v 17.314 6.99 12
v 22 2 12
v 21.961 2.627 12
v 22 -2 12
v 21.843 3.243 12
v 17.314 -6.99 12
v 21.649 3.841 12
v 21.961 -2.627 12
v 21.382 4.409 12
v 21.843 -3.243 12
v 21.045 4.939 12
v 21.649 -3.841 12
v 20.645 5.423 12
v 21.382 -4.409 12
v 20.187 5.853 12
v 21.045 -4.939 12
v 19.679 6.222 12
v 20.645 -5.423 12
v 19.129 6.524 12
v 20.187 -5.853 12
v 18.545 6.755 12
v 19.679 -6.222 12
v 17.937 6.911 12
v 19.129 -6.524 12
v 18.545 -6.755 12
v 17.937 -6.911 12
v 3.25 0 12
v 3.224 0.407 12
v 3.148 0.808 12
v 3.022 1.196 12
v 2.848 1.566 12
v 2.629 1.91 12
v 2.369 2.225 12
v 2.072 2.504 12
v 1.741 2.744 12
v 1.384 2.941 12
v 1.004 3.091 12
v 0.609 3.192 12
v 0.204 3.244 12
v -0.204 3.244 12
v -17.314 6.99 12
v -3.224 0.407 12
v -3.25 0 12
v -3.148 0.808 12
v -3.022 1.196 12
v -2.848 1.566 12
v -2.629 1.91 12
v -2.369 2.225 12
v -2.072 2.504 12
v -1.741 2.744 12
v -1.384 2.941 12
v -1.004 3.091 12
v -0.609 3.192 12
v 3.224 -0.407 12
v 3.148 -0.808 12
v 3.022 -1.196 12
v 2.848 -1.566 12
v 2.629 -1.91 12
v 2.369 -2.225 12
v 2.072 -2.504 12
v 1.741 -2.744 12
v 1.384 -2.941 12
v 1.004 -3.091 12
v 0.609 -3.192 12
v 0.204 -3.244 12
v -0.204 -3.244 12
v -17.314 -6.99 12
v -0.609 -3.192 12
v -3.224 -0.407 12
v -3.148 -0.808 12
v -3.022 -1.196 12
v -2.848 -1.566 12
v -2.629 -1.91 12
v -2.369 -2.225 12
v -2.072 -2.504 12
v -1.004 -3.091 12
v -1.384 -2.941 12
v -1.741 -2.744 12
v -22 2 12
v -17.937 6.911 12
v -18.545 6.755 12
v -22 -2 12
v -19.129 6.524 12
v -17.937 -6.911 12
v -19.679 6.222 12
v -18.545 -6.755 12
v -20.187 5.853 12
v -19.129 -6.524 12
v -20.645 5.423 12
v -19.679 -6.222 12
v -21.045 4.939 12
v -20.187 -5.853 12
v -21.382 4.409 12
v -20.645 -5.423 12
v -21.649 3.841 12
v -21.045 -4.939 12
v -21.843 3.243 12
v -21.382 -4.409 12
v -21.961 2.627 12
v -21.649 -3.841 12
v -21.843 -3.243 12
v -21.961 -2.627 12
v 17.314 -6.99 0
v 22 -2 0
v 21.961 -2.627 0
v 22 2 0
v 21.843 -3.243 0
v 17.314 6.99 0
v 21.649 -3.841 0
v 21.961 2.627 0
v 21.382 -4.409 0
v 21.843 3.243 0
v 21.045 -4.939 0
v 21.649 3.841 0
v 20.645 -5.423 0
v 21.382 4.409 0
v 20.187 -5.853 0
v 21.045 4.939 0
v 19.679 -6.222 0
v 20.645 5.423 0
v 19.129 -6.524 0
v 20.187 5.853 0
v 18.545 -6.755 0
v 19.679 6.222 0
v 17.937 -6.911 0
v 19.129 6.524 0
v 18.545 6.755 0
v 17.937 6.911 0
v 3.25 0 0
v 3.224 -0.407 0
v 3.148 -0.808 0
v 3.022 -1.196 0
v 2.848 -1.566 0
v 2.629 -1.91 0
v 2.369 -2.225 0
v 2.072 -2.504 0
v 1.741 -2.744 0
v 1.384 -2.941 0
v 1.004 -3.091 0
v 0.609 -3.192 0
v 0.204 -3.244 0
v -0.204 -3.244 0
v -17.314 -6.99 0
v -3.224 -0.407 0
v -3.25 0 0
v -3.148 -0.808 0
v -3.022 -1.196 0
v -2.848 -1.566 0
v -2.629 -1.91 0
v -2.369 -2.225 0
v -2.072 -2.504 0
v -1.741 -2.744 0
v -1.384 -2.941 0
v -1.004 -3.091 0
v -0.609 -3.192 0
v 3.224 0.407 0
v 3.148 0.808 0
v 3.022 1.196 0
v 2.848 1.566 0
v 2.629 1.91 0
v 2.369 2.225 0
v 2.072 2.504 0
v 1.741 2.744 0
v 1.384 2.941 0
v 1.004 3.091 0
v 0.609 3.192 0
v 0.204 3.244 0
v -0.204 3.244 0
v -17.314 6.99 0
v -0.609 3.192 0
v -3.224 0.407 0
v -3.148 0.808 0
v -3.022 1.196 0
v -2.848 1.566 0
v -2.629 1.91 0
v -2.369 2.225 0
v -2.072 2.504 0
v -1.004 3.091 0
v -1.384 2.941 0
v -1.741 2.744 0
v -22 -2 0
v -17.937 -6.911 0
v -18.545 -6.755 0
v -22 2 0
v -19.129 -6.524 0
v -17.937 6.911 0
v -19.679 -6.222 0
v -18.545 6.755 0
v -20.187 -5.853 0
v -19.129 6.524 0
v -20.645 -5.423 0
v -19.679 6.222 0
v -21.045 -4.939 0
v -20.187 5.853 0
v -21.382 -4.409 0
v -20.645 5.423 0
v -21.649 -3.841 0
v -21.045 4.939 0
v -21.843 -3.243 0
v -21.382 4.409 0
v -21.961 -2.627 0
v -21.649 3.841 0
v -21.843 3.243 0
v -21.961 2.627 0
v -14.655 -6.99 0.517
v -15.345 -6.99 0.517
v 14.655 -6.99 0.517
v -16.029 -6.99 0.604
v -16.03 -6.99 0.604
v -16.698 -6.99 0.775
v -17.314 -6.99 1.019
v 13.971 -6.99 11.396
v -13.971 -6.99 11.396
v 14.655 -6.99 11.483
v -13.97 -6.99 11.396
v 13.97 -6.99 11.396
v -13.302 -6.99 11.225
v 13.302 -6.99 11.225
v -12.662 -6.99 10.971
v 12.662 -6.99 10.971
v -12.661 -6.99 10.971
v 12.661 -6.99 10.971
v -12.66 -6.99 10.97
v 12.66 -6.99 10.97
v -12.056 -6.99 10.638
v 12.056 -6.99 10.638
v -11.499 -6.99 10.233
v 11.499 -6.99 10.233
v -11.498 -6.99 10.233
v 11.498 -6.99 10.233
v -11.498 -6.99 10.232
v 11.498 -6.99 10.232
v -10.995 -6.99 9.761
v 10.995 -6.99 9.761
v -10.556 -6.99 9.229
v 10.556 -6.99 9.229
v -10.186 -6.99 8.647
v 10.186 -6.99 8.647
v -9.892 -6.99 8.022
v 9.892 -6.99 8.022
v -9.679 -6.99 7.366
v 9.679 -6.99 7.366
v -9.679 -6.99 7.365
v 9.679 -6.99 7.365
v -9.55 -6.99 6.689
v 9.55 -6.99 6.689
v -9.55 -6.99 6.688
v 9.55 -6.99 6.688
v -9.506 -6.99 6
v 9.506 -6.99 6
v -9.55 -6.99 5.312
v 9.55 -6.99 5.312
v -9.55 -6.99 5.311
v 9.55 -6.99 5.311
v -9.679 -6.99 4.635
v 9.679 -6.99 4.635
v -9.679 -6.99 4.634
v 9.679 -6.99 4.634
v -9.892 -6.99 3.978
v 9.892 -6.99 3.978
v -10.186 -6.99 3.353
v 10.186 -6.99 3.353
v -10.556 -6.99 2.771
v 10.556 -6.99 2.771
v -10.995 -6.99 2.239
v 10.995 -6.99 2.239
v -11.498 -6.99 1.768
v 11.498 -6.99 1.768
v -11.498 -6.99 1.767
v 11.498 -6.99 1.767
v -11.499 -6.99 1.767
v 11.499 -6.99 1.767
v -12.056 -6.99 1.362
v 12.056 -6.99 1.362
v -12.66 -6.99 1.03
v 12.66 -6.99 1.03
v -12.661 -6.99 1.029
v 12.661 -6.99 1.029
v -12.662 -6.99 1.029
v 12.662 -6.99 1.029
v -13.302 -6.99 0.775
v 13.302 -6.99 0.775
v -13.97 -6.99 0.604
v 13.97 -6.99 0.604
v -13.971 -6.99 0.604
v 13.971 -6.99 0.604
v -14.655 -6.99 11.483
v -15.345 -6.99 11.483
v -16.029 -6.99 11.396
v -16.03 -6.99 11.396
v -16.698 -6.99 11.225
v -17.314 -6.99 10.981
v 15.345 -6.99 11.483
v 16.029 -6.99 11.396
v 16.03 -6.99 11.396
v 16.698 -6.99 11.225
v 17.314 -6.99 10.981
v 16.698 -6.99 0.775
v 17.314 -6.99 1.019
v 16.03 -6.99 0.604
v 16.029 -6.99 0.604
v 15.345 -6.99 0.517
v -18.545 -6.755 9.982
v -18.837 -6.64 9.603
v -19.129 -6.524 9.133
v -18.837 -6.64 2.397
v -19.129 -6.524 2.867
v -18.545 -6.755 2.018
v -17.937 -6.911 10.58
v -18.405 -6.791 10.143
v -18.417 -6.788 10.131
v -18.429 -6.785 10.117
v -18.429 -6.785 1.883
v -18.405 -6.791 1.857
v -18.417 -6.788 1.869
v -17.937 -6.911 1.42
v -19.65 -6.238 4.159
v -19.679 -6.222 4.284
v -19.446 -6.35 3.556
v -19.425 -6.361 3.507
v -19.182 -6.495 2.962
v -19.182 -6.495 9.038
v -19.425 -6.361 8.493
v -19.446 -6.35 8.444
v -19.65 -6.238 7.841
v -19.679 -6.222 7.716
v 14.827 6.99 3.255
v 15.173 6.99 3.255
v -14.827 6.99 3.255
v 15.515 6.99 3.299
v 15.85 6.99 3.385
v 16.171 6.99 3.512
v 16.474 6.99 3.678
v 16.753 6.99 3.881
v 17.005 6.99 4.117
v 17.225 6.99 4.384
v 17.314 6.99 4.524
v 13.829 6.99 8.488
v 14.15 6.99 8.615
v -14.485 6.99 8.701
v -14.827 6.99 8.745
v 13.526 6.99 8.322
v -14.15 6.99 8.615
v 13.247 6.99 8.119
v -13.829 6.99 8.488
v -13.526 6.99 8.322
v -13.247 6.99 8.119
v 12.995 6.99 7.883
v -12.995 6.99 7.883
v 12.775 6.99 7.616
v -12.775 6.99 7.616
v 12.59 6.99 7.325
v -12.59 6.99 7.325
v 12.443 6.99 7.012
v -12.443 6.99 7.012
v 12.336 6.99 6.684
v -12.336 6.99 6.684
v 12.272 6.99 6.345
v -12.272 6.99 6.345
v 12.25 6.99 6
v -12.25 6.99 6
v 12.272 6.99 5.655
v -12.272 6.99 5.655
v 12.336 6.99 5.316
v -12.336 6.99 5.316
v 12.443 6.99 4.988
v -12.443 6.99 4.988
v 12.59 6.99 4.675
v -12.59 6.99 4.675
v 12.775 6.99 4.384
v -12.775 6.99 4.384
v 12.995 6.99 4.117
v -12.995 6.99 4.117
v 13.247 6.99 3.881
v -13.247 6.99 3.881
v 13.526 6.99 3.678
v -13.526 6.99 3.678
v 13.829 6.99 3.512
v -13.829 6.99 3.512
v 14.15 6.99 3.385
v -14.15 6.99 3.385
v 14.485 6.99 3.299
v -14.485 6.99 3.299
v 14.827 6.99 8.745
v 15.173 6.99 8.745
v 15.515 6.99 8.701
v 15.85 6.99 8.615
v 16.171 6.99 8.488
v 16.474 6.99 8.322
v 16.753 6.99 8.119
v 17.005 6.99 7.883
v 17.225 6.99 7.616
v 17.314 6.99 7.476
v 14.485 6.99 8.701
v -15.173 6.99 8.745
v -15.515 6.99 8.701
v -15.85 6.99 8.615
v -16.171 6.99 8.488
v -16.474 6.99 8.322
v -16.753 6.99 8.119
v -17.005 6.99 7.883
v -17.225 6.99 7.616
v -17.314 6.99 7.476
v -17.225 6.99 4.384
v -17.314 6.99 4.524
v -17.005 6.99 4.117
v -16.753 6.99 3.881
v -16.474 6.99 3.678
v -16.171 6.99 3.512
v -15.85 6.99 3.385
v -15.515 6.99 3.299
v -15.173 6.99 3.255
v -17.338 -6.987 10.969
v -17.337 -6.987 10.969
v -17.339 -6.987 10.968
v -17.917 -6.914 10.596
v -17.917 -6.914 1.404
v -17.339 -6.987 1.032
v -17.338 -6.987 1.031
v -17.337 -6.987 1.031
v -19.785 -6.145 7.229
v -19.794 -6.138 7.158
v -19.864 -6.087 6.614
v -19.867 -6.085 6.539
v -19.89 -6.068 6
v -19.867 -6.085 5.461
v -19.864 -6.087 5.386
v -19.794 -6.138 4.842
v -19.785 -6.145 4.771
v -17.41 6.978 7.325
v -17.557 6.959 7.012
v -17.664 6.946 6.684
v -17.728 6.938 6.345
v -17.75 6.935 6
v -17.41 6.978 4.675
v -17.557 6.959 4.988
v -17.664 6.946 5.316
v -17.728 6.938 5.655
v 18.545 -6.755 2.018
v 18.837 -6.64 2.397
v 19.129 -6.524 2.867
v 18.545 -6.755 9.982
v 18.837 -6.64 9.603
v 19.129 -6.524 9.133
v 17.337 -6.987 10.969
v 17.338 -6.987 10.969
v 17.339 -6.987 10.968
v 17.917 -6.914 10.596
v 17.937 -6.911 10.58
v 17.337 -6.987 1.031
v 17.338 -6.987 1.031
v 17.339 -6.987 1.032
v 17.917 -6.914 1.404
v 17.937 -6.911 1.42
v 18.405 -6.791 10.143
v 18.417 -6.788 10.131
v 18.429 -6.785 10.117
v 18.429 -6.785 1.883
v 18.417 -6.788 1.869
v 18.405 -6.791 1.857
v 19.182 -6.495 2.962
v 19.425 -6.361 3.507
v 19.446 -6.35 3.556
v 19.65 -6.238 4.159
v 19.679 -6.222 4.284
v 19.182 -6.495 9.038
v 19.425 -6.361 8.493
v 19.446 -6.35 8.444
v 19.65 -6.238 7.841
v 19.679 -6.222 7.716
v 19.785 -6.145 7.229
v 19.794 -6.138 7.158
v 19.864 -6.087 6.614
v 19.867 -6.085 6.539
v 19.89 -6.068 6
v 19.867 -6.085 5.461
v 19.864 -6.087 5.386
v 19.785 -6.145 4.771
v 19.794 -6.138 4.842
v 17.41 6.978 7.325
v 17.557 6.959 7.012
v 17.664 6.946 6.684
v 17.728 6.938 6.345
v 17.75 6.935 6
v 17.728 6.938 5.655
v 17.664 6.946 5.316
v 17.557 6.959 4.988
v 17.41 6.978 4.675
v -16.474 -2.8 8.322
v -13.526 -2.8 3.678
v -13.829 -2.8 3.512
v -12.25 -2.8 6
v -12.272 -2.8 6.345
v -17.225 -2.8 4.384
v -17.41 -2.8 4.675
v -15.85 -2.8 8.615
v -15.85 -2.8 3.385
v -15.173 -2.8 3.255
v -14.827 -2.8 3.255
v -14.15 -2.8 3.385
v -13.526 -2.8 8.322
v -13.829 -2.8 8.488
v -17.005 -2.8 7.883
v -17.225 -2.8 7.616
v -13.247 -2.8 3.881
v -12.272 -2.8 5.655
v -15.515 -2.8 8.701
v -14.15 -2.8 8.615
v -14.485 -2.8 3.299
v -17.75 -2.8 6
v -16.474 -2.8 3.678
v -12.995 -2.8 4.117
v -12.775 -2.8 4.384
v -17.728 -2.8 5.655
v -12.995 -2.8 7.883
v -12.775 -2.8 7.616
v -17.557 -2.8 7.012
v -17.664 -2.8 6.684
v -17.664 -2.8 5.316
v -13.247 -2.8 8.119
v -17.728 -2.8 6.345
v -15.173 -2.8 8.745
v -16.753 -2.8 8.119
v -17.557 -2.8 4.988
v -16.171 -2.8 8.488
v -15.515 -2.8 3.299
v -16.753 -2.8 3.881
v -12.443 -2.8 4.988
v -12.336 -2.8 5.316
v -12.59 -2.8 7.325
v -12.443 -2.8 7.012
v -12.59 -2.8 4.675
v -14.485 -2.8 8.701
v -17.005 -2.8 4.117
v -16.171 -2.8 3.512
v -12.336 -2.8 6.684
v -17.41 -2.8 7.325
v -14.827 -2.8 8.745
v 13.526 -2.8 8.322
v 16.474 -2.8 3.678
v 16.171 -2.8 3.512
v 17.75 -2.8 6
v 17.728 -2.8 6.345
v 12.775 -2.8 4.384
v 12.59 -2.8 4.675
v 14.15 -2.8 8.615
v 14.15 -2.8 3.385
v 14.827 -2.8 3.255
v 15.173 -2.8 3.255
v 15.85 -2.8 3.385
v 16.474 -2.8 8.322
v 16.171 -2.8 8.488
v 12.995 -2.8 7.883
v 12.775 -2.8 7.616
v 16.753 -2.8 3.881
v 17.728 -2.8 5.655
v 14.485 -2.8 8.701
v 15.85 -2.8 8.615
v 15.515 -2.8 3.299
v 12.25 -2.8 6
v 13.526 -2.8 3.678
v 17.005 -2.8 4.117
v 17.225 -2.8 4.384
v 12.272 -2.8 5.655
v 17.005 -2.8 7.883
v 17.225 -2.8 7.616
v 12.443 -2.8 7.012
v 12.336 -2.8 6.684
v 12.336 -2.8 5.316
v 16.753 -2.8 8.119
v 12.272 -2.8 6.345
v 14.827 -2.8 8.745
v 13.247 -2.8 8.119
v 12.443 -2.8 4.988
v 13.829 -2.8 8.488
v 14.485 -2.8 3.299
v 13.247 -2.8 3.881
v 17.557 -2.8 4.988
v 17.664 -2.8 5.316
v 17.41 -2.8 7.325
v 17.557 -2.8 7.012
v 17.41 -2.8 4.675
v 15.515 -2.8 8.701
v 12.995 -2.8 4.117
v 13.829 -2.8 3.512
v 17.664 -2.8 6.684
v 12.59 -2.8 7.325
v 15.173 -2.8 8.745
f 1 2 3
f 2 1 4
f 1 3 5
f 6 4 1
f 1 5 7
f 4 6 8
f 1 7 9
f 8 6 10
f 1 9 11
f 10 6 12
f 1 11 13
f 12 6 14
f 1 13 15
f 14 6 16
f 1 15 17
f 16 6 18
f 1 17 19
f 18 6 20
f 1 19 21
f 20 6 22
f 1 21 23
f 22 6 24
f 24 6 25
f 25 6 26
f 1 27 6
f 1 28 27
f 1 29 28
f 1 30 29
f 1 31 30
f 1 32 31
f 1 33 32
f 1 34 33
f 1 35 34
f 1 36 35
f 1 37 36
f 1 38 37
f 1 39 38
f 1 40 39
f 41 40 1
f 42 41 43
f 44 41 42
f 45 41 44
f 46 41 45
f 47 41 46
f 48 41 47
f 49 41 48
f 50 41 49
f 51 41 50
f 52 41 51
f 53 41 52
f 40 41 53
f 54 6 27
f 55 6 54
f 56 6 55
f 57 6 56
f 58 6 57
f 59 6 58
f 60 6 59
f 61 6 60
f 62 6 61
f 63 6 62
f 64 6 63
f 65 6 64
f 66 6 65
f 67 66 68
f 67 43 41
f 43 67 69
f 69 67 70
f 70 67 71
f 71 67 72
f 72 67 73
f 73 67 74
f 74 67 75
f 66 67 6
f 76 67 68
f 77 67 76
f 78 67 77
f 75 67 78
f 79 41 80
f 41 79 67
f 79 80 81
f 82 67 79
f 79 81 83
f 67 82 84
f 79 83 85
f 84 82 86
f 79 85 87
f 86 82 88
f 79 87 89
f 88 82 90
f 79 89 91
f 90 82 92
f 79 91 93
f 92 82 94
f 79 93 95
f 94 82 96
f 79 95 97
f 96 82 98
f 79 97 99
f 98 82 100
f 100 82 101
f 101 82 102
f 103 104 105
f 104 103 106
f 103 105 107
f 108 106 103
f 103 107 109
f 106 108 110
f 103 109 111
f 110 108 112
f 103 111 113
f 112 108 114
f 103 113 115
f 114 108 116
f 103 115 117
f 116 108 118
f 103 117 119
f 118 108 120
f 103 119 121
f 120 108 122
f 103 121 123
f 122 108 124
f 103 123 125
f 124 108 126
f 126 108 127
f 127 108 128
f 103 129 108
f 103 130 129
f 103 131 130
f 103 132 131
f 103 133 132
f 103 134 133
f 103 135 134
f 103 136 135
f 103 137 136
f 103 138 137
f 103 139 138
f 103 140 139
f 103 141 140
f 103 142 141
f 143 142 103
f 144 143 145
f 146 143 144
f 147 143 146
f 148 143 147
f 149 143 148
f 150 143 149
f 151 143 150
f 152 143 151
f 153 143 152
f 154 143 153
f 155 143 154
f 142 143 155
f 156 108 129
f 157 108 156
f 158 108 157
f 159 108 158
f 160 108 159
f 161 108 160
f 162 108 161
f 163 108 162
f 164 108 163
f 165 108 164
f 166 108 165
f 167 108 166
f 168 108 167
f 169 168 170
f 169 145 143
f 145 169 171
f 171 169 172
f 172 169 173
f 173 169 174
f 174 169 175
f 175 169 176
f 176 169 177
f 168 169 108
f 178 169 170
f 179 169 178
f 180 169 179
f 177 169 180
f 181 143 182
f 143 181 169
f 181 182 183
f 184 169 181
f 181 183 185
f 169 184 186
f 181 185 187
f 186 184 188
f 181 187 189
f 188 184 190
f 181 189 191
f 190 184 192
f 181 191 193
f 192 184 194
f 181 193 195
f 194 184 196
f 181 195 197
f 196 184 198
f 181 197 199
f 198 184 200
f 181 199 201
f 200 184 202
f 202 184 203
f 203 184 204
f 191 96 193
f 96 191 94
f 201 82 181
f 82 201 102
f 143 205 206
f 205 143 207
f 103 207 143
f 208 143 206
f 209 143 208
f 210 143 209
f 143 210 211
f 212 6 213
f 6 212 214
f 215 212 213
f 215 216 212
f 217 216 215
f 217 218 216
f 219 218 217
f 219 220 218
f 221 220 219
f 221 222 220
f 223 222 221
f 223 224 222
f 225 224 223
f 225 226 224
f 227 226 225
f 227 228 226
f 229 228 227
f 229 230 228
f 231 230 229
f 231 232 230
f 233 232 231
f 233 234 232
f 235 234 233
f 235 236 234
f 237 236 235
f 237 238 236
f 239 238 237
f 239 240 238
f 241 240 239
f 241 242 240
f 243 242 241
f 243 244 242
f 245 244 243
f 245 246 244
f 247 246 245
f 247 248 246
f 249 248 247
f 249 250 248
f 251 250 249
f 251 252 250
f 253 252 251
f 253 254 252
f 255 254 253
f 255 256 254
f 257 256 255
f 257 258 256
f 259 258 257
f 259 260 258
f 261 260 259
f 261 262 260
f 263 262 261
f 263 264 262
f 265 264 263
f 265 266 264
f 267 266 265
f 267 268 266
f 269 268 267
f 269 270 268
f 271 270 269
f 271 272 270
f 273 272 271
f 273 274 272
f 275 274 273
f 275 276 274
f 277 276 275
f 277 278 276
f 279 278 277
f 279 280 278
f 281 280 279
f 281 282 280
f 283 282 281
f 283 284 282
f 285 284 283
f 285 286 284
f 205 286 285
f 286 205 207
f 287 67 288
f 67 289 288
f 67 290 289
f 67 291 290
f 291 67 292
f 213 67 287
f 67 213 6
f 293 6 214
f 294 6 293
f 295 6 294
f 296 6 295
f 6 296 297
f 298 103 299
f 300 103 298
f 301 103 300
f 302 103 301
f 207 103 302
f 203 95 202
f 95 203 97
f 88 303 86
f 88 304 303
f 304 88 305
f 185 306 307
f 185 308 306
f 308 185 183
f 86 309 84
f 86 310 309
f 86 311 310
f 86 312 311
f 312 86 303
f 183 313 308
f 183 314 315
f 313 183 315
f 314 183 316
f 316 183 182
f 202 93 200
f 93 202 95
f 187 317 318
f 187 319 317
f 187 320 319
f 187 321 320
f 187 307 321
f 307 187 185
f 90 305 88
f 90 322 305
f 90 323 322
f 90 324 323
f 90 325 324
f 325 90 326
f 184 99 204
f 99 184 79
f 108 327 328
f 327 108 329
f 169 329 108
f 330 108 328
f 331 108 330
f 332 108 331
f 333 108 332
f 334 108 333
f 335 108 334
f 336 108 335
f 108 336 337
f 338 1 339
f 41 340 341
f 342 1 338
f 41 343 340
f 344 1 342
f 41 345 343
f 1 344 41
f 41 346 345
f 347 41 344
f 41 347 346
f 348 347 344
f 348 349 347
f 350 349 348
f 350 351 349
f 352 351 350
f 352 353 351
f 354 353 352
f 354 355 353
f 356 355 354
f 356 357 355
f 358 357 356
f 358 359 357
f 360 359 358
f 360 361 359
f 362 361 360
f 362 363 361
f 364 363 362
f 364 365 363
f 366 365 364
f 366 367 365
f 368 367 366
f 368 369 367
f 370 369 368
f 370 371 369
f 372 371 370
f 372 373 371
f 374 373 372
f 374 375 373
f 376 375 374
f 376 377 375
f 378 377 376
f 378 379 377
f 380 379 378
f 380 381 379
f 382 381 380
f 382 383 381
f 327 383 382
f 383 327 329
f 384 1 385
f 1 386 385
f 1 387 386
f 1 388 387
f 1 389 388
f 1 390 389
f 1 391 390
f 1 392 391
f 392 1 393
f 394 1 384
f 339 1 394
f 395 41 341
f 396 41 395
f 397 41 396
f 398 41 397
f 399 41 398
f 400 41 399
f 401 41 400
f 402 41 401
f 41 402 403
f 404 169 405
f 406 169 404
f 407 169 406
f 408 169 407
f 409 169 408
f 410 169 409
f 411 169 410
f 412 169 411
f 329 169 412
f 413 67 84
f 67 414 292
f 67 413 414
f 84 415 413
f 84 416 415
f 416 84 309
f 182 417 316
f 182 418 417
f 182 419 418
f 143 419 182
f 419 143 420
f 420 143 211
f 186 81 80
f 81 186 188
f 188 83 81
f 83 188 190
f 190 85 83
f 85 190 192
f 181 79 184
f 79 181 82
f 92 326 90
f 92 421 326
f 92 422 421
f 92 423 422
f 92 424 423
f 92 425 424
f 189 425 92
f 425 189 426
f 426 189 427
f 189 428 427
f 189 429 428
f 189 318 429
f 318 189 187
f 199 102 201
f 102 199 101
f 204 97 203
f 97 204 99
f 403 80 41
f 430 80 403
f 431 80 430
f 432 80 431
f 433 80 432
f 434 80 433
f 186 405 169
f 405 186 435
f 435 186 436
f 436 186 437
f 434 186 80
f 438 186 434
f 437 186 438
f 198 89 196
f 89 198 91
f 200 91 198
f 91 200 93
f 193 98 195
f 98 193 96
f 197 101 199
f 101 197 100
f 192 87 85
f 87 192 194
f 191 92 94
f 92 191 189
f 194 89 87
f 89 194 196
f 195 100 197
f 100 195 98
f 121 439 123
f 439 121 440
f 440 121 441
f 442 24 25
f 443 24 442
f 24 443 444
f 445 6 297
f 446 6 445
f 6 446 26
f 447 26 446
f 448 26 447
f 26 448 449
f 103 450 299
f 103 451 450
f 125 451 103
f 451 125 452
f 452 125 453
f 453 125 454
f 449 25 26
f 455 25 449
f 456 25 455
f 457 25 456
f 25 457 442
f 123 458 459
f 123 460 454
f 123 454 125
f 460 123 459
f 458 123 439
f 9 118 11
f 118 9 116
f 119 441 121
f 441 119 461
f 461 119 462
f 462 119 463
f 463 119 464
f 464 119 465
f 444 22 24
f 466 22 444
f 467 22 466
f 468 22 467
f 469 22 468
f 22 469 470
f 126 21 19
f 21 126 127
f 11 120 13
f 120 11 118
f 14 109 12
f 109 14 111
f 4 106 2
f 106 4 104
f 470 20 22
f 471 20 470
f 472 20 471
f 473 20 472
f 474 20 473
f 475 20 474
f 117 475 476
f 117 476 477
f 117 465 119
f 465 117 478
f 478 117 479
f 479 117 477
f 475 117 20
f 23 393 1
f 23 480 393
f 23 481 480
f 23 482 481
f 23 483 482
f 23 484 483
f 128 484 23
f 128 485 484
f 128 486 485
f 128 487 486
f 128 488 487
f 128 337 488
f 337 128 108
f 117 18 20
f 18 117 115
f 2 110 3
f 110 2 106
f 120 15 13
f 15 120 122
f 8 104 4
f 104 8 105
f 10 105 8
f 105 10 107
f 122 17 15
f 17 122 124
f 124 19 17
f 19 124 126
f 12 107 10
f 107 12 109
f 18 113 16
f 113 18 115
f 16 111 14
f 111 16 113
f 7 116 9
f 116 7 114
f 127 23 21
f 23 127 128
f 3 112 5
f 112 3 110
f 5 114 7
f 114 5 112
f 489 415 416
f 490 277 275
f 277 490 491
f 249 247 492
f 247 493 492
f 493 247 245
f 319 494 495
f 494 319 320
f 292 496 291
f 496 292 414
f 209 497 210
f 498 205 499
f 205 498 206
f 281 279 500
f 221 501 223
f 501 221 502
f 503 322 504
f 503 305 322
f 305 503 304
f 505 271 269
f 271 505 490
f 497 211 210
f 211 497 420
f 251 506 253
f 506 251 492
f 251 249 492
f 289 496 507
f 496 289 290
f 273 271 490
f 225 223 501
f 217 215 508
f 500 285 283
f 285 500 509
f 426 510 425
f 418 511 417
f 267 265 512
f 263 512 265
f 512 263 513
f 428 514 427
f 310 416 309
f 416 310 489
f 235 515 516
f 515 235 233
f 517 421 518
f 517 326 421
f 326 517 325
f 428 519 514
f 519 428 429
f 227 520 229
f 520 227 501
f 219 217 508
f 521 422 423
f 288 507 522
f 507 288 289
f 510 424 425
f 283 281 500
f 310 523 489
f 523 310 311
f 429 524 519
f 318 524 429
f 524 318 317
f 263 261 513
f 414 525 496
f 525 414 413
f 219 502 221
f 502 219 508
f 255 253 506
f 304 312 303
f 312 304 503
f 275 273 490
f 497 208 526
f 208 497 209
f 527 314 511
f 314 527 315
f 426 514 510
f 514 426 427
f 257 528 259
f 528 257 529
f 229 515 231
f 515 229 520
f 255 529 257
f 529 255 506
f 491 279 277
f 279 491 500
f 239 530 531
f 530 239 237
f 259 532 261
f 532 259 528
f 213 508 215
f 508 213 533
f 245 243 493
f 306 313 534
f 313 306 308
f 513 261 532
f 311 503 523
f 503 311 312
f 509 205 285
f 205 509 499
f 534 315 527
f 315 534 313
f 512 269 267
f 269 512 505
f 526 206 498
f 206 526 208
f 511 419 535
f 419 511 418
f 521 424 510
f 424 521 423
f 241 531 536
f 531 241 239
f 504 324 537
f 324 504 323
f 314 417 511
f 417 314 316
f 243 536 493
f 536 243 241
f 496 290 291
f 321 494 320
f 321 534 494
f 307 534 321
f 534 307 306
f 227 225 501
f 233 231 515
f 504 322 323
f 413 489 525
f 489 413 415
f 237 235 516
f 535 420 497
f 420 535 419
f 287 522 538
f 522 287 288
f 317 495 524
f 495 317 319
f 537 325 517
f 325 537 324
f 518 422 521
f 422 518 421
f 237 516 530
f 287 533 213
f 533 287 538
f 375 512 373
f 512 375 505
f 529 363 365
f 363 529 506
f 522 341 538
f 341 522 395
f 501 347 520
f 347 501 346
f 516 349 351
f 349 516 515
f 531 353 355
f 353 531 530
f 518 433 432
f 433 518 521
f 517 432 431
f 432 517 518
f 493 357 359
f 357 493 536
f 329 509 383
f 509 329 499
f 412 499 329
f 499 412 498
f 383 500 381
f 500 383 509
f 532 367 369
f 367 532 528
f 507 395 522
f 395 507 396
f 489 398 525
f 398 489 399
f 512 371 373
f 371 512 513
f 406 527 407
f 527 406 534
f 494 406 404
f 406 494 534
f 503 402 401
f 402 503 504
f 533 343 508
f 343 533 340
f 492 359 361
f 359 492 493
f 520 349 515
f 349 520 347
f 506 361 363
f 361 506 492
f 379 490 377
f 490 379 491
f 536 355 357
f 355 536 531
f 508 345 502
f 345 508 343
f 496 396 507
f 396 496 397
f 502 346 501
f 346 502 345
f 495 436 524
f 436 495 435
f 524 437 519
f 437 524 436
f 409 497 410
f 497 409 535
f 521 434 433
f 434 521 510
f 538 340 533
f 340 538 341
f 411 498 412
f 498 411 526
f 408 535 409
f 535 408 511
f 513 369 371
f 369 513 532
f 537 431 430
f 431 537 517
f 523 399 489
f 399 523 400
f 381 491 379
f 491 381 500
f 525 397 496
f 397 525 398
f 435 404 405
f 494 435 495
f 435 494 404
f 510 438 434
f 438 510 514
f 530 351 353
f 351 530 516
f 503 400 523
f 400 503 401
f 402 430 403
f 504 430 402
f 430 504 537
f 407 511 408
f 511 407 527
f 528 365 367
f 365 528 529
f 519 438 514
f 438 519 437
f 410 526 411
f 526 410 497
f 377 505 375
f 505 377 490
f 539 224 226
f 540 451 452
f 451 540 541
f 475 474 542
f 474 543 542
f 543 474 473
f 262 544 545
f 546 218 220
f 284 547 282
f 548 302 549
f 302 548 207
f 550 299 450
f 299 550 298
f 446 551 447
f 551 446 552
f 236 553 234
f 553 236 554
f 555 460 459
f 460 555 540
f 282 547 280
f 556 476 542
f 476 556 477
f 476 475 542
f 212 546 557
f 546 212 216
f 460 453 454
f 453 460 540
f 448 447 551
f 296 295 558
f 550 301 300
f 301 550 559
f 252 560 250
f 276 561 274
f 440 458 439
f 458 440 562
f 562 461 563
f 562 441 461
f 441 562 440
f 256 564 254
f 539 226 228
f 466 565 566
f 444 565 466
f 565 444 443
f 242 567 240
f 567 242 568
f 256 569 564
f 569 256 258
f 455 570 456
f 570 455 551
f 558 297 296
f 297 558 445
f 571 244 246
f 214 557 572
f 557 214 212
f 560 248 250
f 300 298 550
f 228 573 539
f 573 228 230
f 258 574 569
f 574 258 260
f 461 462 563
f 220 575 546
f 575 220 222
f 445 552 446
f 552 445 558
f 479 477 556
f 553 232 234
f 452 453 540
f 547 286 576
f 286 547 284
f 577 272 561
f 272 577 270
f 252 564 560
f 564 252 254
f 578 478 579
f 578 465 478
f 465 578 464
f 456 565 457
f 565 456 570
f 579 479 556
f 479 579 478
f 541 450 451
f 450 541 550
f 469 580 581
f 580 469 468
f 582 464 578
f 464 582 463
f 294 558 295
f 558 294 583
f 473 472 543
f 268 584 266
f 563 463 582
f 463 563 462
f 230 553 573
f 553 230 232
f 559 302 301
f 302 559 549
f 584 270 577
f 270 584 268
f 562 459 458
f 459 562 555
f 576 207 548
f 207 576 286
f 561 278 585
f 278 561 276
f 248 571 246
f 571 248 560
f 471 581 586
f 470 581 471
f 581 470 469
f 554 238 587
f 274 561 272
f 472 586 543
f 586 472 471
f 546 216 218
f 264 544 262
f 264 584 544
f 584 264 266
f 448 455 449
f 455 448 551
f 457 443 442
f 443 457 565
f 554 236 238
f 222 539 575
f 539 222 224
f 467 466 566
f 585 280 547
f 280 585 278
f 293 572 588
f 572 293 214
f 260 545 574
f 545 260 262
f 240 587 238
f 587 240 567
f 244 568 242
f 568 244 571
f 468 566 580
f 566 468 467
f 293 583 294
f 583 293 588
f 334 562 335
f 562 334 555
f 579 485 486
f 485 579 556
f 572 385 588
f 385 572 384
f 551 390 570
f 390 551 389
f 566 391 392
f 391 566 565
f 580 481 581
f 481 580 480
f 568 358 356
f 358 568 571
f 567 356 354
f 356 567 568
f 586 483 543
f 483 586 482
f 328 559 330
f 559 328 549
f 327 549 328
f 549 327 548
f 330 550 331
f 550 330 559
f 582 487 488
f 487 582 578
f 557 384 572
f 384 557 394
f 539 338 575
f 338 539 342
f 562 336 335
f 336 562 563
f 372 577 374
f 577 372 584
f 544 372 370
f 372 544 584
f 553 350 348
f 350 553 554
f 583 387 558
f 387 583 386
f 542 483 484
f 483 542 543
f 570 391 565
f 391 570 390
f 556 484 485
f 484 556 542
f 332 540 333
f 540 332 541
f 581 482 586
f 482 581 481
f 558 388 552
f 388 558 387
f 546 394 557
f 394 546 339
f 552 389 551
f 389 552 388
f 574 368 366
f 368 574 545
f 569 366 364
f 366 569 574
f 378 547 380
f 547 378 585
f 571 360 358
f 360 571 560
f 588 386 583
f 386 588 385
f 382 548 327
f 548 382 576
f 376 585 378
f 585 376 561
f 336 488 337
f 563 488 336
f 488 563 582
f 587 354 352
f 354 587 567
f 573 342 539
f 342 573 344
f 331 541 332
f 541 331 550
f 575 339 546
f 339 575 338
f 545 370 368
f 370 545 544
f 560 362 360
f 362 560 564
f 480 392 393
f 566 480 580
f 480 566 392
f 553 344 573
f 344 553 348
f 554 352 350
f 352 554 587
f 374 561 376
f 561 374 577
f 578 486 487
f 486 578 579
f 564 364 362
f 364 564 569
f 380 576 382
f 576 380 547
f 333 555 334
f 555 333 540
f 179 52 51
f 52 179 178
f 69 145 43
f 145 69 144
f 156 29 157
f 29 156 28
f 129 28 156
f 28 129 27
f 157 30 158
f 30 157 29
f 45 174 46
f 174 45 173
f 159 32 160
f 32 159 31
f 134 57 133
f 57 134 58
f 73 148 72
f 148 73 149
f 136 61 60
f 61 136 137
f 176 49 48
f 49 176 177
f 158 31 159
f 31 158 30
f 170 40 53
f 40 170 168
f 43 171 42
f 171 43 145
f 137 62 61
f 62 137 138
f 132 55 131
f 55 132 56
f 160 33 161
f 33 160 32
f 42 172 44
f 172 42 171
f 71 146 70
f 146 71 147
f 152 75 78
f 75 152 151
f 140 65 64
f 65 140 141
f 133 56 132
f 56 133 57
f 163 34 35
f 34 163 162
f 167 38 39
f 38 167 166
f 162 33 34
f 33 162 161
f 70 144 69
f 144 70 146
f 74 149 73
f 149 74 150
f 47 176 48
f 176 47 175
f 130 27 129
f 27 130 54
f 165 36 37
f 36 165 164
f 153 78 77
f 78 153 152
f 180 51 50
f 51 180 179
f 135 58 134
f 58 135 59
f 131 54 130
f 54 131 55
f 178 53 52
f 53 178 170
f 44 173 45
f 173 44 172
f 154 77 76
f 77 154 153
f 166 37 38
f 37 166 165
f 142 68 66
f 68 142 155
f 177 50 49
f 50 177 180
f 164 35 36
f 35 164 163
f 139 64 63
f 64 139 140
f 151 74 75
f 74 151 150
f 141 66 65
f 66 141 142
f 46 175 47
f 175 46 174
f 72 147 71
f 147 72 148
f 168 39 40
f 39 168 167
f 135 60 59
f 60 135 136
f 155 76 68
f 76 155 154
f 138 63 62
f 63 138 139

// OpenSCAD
$fn = 50;


difference() {
	union() {
		cylinder(h = 12, r = 7.0000000000);
		translate(v = [-7.5000000000, 0.0000000000, 0]) {
			hull() {
				translate(v = [-9.5000000000, 2.0000000000, 0]) {
					cylinder(h = 12, r = 5);
				}
				translate(v = [9.5000000000, 2.0000000000, 0]) {
					cylinder(h = 12, r = 5);
				}
				translate(v = [-9.5000000000, -2.0000000000, 0]) {
					cylinder(h = 12, r = 5);
				}
				translate(v = [9.5000000000, -2.0000000000, 0]) {
					cylinder(h = 12, r = 5);
				}
			}
		}
		translate(v = [7.5000000000, 0.0000000000, 0]) {
			hull() {
				translate(v = [-9.5000000000, 2.0000000000, 0]) {
					cylinder(h = 12, r = 5);
				}
				translate(v = [9.5000000000, 2.0000000000, 0]) {
					cylinder(h = 12, r = 5);
				}
				translate(v = [-9.5000000000, -2.0000000000, 0]) {
					cylinder(h = 12, r = 5);
				}
				translate(v = [9.5000000000, -2.0000000000, 0]) {
					cylinder(h = 12, r = 5);
				}
			}
		}
	}
	union() {
		translate(v = [-15.0000000000, -7.0000000000, 6.0000000000]) {
			rotate(a = [90, 0, 0]) {
				difference() {
					union() {
						#translate(v = [0, 0, -14.0000000000]) {
							cylinder(h = 14, r = 2.2500000000);
						}
						#translate(v = [0, 0, -4.2000000000]) {
							cylinder(h = 4.2000000000, r1 = 2.7500000000, r2 = 5.5000000000);
						}
						#translate(v = [0, 0, -14.0000000000]) {
							cylinder(h = 14, r = 2.7500000000);
						}
						#translate(v = [0, 0, -14.0000000000]) {
							cylinder(h = 14, r = 2.2500000000);
						}
					}
					union();
				}
			}
		}
		translate(v = [15.0000000000, -7.0000000000, 6.0000000000]) {
			rotate(a = [90, 0, 0]) {
				difference() {
					union() {
						#translate(v = [0, 0, -14.0000000000]) {
							cylinder(h = 14, r = 2.2500000000);
						}
						#translate(v = [0, 0, -4.2000000000]) {
							cylinder(h = 4.2000000000, r1 = 2.7500000000, r2 = 5.5000000000);
						}
						#translate(v = [0, 0, -14.0000000000]) {
							cylinder(h = 14, r = 2.7500000000);
						}
						#translate(v = [0, 0, -14.0000000000]) {
							cylinder(h = 14, r = 2.2500000000);
						}
					}
					union();
				}
			}
		}
		translate(v = [0, 0, -100]) {
			cylinder(h = 200, r = 3.2500000000);
		}
		translate(v = [0, 0, -100]) {
			cylinder(h = 200, r = 1.8000000000);
		}
	}
}
